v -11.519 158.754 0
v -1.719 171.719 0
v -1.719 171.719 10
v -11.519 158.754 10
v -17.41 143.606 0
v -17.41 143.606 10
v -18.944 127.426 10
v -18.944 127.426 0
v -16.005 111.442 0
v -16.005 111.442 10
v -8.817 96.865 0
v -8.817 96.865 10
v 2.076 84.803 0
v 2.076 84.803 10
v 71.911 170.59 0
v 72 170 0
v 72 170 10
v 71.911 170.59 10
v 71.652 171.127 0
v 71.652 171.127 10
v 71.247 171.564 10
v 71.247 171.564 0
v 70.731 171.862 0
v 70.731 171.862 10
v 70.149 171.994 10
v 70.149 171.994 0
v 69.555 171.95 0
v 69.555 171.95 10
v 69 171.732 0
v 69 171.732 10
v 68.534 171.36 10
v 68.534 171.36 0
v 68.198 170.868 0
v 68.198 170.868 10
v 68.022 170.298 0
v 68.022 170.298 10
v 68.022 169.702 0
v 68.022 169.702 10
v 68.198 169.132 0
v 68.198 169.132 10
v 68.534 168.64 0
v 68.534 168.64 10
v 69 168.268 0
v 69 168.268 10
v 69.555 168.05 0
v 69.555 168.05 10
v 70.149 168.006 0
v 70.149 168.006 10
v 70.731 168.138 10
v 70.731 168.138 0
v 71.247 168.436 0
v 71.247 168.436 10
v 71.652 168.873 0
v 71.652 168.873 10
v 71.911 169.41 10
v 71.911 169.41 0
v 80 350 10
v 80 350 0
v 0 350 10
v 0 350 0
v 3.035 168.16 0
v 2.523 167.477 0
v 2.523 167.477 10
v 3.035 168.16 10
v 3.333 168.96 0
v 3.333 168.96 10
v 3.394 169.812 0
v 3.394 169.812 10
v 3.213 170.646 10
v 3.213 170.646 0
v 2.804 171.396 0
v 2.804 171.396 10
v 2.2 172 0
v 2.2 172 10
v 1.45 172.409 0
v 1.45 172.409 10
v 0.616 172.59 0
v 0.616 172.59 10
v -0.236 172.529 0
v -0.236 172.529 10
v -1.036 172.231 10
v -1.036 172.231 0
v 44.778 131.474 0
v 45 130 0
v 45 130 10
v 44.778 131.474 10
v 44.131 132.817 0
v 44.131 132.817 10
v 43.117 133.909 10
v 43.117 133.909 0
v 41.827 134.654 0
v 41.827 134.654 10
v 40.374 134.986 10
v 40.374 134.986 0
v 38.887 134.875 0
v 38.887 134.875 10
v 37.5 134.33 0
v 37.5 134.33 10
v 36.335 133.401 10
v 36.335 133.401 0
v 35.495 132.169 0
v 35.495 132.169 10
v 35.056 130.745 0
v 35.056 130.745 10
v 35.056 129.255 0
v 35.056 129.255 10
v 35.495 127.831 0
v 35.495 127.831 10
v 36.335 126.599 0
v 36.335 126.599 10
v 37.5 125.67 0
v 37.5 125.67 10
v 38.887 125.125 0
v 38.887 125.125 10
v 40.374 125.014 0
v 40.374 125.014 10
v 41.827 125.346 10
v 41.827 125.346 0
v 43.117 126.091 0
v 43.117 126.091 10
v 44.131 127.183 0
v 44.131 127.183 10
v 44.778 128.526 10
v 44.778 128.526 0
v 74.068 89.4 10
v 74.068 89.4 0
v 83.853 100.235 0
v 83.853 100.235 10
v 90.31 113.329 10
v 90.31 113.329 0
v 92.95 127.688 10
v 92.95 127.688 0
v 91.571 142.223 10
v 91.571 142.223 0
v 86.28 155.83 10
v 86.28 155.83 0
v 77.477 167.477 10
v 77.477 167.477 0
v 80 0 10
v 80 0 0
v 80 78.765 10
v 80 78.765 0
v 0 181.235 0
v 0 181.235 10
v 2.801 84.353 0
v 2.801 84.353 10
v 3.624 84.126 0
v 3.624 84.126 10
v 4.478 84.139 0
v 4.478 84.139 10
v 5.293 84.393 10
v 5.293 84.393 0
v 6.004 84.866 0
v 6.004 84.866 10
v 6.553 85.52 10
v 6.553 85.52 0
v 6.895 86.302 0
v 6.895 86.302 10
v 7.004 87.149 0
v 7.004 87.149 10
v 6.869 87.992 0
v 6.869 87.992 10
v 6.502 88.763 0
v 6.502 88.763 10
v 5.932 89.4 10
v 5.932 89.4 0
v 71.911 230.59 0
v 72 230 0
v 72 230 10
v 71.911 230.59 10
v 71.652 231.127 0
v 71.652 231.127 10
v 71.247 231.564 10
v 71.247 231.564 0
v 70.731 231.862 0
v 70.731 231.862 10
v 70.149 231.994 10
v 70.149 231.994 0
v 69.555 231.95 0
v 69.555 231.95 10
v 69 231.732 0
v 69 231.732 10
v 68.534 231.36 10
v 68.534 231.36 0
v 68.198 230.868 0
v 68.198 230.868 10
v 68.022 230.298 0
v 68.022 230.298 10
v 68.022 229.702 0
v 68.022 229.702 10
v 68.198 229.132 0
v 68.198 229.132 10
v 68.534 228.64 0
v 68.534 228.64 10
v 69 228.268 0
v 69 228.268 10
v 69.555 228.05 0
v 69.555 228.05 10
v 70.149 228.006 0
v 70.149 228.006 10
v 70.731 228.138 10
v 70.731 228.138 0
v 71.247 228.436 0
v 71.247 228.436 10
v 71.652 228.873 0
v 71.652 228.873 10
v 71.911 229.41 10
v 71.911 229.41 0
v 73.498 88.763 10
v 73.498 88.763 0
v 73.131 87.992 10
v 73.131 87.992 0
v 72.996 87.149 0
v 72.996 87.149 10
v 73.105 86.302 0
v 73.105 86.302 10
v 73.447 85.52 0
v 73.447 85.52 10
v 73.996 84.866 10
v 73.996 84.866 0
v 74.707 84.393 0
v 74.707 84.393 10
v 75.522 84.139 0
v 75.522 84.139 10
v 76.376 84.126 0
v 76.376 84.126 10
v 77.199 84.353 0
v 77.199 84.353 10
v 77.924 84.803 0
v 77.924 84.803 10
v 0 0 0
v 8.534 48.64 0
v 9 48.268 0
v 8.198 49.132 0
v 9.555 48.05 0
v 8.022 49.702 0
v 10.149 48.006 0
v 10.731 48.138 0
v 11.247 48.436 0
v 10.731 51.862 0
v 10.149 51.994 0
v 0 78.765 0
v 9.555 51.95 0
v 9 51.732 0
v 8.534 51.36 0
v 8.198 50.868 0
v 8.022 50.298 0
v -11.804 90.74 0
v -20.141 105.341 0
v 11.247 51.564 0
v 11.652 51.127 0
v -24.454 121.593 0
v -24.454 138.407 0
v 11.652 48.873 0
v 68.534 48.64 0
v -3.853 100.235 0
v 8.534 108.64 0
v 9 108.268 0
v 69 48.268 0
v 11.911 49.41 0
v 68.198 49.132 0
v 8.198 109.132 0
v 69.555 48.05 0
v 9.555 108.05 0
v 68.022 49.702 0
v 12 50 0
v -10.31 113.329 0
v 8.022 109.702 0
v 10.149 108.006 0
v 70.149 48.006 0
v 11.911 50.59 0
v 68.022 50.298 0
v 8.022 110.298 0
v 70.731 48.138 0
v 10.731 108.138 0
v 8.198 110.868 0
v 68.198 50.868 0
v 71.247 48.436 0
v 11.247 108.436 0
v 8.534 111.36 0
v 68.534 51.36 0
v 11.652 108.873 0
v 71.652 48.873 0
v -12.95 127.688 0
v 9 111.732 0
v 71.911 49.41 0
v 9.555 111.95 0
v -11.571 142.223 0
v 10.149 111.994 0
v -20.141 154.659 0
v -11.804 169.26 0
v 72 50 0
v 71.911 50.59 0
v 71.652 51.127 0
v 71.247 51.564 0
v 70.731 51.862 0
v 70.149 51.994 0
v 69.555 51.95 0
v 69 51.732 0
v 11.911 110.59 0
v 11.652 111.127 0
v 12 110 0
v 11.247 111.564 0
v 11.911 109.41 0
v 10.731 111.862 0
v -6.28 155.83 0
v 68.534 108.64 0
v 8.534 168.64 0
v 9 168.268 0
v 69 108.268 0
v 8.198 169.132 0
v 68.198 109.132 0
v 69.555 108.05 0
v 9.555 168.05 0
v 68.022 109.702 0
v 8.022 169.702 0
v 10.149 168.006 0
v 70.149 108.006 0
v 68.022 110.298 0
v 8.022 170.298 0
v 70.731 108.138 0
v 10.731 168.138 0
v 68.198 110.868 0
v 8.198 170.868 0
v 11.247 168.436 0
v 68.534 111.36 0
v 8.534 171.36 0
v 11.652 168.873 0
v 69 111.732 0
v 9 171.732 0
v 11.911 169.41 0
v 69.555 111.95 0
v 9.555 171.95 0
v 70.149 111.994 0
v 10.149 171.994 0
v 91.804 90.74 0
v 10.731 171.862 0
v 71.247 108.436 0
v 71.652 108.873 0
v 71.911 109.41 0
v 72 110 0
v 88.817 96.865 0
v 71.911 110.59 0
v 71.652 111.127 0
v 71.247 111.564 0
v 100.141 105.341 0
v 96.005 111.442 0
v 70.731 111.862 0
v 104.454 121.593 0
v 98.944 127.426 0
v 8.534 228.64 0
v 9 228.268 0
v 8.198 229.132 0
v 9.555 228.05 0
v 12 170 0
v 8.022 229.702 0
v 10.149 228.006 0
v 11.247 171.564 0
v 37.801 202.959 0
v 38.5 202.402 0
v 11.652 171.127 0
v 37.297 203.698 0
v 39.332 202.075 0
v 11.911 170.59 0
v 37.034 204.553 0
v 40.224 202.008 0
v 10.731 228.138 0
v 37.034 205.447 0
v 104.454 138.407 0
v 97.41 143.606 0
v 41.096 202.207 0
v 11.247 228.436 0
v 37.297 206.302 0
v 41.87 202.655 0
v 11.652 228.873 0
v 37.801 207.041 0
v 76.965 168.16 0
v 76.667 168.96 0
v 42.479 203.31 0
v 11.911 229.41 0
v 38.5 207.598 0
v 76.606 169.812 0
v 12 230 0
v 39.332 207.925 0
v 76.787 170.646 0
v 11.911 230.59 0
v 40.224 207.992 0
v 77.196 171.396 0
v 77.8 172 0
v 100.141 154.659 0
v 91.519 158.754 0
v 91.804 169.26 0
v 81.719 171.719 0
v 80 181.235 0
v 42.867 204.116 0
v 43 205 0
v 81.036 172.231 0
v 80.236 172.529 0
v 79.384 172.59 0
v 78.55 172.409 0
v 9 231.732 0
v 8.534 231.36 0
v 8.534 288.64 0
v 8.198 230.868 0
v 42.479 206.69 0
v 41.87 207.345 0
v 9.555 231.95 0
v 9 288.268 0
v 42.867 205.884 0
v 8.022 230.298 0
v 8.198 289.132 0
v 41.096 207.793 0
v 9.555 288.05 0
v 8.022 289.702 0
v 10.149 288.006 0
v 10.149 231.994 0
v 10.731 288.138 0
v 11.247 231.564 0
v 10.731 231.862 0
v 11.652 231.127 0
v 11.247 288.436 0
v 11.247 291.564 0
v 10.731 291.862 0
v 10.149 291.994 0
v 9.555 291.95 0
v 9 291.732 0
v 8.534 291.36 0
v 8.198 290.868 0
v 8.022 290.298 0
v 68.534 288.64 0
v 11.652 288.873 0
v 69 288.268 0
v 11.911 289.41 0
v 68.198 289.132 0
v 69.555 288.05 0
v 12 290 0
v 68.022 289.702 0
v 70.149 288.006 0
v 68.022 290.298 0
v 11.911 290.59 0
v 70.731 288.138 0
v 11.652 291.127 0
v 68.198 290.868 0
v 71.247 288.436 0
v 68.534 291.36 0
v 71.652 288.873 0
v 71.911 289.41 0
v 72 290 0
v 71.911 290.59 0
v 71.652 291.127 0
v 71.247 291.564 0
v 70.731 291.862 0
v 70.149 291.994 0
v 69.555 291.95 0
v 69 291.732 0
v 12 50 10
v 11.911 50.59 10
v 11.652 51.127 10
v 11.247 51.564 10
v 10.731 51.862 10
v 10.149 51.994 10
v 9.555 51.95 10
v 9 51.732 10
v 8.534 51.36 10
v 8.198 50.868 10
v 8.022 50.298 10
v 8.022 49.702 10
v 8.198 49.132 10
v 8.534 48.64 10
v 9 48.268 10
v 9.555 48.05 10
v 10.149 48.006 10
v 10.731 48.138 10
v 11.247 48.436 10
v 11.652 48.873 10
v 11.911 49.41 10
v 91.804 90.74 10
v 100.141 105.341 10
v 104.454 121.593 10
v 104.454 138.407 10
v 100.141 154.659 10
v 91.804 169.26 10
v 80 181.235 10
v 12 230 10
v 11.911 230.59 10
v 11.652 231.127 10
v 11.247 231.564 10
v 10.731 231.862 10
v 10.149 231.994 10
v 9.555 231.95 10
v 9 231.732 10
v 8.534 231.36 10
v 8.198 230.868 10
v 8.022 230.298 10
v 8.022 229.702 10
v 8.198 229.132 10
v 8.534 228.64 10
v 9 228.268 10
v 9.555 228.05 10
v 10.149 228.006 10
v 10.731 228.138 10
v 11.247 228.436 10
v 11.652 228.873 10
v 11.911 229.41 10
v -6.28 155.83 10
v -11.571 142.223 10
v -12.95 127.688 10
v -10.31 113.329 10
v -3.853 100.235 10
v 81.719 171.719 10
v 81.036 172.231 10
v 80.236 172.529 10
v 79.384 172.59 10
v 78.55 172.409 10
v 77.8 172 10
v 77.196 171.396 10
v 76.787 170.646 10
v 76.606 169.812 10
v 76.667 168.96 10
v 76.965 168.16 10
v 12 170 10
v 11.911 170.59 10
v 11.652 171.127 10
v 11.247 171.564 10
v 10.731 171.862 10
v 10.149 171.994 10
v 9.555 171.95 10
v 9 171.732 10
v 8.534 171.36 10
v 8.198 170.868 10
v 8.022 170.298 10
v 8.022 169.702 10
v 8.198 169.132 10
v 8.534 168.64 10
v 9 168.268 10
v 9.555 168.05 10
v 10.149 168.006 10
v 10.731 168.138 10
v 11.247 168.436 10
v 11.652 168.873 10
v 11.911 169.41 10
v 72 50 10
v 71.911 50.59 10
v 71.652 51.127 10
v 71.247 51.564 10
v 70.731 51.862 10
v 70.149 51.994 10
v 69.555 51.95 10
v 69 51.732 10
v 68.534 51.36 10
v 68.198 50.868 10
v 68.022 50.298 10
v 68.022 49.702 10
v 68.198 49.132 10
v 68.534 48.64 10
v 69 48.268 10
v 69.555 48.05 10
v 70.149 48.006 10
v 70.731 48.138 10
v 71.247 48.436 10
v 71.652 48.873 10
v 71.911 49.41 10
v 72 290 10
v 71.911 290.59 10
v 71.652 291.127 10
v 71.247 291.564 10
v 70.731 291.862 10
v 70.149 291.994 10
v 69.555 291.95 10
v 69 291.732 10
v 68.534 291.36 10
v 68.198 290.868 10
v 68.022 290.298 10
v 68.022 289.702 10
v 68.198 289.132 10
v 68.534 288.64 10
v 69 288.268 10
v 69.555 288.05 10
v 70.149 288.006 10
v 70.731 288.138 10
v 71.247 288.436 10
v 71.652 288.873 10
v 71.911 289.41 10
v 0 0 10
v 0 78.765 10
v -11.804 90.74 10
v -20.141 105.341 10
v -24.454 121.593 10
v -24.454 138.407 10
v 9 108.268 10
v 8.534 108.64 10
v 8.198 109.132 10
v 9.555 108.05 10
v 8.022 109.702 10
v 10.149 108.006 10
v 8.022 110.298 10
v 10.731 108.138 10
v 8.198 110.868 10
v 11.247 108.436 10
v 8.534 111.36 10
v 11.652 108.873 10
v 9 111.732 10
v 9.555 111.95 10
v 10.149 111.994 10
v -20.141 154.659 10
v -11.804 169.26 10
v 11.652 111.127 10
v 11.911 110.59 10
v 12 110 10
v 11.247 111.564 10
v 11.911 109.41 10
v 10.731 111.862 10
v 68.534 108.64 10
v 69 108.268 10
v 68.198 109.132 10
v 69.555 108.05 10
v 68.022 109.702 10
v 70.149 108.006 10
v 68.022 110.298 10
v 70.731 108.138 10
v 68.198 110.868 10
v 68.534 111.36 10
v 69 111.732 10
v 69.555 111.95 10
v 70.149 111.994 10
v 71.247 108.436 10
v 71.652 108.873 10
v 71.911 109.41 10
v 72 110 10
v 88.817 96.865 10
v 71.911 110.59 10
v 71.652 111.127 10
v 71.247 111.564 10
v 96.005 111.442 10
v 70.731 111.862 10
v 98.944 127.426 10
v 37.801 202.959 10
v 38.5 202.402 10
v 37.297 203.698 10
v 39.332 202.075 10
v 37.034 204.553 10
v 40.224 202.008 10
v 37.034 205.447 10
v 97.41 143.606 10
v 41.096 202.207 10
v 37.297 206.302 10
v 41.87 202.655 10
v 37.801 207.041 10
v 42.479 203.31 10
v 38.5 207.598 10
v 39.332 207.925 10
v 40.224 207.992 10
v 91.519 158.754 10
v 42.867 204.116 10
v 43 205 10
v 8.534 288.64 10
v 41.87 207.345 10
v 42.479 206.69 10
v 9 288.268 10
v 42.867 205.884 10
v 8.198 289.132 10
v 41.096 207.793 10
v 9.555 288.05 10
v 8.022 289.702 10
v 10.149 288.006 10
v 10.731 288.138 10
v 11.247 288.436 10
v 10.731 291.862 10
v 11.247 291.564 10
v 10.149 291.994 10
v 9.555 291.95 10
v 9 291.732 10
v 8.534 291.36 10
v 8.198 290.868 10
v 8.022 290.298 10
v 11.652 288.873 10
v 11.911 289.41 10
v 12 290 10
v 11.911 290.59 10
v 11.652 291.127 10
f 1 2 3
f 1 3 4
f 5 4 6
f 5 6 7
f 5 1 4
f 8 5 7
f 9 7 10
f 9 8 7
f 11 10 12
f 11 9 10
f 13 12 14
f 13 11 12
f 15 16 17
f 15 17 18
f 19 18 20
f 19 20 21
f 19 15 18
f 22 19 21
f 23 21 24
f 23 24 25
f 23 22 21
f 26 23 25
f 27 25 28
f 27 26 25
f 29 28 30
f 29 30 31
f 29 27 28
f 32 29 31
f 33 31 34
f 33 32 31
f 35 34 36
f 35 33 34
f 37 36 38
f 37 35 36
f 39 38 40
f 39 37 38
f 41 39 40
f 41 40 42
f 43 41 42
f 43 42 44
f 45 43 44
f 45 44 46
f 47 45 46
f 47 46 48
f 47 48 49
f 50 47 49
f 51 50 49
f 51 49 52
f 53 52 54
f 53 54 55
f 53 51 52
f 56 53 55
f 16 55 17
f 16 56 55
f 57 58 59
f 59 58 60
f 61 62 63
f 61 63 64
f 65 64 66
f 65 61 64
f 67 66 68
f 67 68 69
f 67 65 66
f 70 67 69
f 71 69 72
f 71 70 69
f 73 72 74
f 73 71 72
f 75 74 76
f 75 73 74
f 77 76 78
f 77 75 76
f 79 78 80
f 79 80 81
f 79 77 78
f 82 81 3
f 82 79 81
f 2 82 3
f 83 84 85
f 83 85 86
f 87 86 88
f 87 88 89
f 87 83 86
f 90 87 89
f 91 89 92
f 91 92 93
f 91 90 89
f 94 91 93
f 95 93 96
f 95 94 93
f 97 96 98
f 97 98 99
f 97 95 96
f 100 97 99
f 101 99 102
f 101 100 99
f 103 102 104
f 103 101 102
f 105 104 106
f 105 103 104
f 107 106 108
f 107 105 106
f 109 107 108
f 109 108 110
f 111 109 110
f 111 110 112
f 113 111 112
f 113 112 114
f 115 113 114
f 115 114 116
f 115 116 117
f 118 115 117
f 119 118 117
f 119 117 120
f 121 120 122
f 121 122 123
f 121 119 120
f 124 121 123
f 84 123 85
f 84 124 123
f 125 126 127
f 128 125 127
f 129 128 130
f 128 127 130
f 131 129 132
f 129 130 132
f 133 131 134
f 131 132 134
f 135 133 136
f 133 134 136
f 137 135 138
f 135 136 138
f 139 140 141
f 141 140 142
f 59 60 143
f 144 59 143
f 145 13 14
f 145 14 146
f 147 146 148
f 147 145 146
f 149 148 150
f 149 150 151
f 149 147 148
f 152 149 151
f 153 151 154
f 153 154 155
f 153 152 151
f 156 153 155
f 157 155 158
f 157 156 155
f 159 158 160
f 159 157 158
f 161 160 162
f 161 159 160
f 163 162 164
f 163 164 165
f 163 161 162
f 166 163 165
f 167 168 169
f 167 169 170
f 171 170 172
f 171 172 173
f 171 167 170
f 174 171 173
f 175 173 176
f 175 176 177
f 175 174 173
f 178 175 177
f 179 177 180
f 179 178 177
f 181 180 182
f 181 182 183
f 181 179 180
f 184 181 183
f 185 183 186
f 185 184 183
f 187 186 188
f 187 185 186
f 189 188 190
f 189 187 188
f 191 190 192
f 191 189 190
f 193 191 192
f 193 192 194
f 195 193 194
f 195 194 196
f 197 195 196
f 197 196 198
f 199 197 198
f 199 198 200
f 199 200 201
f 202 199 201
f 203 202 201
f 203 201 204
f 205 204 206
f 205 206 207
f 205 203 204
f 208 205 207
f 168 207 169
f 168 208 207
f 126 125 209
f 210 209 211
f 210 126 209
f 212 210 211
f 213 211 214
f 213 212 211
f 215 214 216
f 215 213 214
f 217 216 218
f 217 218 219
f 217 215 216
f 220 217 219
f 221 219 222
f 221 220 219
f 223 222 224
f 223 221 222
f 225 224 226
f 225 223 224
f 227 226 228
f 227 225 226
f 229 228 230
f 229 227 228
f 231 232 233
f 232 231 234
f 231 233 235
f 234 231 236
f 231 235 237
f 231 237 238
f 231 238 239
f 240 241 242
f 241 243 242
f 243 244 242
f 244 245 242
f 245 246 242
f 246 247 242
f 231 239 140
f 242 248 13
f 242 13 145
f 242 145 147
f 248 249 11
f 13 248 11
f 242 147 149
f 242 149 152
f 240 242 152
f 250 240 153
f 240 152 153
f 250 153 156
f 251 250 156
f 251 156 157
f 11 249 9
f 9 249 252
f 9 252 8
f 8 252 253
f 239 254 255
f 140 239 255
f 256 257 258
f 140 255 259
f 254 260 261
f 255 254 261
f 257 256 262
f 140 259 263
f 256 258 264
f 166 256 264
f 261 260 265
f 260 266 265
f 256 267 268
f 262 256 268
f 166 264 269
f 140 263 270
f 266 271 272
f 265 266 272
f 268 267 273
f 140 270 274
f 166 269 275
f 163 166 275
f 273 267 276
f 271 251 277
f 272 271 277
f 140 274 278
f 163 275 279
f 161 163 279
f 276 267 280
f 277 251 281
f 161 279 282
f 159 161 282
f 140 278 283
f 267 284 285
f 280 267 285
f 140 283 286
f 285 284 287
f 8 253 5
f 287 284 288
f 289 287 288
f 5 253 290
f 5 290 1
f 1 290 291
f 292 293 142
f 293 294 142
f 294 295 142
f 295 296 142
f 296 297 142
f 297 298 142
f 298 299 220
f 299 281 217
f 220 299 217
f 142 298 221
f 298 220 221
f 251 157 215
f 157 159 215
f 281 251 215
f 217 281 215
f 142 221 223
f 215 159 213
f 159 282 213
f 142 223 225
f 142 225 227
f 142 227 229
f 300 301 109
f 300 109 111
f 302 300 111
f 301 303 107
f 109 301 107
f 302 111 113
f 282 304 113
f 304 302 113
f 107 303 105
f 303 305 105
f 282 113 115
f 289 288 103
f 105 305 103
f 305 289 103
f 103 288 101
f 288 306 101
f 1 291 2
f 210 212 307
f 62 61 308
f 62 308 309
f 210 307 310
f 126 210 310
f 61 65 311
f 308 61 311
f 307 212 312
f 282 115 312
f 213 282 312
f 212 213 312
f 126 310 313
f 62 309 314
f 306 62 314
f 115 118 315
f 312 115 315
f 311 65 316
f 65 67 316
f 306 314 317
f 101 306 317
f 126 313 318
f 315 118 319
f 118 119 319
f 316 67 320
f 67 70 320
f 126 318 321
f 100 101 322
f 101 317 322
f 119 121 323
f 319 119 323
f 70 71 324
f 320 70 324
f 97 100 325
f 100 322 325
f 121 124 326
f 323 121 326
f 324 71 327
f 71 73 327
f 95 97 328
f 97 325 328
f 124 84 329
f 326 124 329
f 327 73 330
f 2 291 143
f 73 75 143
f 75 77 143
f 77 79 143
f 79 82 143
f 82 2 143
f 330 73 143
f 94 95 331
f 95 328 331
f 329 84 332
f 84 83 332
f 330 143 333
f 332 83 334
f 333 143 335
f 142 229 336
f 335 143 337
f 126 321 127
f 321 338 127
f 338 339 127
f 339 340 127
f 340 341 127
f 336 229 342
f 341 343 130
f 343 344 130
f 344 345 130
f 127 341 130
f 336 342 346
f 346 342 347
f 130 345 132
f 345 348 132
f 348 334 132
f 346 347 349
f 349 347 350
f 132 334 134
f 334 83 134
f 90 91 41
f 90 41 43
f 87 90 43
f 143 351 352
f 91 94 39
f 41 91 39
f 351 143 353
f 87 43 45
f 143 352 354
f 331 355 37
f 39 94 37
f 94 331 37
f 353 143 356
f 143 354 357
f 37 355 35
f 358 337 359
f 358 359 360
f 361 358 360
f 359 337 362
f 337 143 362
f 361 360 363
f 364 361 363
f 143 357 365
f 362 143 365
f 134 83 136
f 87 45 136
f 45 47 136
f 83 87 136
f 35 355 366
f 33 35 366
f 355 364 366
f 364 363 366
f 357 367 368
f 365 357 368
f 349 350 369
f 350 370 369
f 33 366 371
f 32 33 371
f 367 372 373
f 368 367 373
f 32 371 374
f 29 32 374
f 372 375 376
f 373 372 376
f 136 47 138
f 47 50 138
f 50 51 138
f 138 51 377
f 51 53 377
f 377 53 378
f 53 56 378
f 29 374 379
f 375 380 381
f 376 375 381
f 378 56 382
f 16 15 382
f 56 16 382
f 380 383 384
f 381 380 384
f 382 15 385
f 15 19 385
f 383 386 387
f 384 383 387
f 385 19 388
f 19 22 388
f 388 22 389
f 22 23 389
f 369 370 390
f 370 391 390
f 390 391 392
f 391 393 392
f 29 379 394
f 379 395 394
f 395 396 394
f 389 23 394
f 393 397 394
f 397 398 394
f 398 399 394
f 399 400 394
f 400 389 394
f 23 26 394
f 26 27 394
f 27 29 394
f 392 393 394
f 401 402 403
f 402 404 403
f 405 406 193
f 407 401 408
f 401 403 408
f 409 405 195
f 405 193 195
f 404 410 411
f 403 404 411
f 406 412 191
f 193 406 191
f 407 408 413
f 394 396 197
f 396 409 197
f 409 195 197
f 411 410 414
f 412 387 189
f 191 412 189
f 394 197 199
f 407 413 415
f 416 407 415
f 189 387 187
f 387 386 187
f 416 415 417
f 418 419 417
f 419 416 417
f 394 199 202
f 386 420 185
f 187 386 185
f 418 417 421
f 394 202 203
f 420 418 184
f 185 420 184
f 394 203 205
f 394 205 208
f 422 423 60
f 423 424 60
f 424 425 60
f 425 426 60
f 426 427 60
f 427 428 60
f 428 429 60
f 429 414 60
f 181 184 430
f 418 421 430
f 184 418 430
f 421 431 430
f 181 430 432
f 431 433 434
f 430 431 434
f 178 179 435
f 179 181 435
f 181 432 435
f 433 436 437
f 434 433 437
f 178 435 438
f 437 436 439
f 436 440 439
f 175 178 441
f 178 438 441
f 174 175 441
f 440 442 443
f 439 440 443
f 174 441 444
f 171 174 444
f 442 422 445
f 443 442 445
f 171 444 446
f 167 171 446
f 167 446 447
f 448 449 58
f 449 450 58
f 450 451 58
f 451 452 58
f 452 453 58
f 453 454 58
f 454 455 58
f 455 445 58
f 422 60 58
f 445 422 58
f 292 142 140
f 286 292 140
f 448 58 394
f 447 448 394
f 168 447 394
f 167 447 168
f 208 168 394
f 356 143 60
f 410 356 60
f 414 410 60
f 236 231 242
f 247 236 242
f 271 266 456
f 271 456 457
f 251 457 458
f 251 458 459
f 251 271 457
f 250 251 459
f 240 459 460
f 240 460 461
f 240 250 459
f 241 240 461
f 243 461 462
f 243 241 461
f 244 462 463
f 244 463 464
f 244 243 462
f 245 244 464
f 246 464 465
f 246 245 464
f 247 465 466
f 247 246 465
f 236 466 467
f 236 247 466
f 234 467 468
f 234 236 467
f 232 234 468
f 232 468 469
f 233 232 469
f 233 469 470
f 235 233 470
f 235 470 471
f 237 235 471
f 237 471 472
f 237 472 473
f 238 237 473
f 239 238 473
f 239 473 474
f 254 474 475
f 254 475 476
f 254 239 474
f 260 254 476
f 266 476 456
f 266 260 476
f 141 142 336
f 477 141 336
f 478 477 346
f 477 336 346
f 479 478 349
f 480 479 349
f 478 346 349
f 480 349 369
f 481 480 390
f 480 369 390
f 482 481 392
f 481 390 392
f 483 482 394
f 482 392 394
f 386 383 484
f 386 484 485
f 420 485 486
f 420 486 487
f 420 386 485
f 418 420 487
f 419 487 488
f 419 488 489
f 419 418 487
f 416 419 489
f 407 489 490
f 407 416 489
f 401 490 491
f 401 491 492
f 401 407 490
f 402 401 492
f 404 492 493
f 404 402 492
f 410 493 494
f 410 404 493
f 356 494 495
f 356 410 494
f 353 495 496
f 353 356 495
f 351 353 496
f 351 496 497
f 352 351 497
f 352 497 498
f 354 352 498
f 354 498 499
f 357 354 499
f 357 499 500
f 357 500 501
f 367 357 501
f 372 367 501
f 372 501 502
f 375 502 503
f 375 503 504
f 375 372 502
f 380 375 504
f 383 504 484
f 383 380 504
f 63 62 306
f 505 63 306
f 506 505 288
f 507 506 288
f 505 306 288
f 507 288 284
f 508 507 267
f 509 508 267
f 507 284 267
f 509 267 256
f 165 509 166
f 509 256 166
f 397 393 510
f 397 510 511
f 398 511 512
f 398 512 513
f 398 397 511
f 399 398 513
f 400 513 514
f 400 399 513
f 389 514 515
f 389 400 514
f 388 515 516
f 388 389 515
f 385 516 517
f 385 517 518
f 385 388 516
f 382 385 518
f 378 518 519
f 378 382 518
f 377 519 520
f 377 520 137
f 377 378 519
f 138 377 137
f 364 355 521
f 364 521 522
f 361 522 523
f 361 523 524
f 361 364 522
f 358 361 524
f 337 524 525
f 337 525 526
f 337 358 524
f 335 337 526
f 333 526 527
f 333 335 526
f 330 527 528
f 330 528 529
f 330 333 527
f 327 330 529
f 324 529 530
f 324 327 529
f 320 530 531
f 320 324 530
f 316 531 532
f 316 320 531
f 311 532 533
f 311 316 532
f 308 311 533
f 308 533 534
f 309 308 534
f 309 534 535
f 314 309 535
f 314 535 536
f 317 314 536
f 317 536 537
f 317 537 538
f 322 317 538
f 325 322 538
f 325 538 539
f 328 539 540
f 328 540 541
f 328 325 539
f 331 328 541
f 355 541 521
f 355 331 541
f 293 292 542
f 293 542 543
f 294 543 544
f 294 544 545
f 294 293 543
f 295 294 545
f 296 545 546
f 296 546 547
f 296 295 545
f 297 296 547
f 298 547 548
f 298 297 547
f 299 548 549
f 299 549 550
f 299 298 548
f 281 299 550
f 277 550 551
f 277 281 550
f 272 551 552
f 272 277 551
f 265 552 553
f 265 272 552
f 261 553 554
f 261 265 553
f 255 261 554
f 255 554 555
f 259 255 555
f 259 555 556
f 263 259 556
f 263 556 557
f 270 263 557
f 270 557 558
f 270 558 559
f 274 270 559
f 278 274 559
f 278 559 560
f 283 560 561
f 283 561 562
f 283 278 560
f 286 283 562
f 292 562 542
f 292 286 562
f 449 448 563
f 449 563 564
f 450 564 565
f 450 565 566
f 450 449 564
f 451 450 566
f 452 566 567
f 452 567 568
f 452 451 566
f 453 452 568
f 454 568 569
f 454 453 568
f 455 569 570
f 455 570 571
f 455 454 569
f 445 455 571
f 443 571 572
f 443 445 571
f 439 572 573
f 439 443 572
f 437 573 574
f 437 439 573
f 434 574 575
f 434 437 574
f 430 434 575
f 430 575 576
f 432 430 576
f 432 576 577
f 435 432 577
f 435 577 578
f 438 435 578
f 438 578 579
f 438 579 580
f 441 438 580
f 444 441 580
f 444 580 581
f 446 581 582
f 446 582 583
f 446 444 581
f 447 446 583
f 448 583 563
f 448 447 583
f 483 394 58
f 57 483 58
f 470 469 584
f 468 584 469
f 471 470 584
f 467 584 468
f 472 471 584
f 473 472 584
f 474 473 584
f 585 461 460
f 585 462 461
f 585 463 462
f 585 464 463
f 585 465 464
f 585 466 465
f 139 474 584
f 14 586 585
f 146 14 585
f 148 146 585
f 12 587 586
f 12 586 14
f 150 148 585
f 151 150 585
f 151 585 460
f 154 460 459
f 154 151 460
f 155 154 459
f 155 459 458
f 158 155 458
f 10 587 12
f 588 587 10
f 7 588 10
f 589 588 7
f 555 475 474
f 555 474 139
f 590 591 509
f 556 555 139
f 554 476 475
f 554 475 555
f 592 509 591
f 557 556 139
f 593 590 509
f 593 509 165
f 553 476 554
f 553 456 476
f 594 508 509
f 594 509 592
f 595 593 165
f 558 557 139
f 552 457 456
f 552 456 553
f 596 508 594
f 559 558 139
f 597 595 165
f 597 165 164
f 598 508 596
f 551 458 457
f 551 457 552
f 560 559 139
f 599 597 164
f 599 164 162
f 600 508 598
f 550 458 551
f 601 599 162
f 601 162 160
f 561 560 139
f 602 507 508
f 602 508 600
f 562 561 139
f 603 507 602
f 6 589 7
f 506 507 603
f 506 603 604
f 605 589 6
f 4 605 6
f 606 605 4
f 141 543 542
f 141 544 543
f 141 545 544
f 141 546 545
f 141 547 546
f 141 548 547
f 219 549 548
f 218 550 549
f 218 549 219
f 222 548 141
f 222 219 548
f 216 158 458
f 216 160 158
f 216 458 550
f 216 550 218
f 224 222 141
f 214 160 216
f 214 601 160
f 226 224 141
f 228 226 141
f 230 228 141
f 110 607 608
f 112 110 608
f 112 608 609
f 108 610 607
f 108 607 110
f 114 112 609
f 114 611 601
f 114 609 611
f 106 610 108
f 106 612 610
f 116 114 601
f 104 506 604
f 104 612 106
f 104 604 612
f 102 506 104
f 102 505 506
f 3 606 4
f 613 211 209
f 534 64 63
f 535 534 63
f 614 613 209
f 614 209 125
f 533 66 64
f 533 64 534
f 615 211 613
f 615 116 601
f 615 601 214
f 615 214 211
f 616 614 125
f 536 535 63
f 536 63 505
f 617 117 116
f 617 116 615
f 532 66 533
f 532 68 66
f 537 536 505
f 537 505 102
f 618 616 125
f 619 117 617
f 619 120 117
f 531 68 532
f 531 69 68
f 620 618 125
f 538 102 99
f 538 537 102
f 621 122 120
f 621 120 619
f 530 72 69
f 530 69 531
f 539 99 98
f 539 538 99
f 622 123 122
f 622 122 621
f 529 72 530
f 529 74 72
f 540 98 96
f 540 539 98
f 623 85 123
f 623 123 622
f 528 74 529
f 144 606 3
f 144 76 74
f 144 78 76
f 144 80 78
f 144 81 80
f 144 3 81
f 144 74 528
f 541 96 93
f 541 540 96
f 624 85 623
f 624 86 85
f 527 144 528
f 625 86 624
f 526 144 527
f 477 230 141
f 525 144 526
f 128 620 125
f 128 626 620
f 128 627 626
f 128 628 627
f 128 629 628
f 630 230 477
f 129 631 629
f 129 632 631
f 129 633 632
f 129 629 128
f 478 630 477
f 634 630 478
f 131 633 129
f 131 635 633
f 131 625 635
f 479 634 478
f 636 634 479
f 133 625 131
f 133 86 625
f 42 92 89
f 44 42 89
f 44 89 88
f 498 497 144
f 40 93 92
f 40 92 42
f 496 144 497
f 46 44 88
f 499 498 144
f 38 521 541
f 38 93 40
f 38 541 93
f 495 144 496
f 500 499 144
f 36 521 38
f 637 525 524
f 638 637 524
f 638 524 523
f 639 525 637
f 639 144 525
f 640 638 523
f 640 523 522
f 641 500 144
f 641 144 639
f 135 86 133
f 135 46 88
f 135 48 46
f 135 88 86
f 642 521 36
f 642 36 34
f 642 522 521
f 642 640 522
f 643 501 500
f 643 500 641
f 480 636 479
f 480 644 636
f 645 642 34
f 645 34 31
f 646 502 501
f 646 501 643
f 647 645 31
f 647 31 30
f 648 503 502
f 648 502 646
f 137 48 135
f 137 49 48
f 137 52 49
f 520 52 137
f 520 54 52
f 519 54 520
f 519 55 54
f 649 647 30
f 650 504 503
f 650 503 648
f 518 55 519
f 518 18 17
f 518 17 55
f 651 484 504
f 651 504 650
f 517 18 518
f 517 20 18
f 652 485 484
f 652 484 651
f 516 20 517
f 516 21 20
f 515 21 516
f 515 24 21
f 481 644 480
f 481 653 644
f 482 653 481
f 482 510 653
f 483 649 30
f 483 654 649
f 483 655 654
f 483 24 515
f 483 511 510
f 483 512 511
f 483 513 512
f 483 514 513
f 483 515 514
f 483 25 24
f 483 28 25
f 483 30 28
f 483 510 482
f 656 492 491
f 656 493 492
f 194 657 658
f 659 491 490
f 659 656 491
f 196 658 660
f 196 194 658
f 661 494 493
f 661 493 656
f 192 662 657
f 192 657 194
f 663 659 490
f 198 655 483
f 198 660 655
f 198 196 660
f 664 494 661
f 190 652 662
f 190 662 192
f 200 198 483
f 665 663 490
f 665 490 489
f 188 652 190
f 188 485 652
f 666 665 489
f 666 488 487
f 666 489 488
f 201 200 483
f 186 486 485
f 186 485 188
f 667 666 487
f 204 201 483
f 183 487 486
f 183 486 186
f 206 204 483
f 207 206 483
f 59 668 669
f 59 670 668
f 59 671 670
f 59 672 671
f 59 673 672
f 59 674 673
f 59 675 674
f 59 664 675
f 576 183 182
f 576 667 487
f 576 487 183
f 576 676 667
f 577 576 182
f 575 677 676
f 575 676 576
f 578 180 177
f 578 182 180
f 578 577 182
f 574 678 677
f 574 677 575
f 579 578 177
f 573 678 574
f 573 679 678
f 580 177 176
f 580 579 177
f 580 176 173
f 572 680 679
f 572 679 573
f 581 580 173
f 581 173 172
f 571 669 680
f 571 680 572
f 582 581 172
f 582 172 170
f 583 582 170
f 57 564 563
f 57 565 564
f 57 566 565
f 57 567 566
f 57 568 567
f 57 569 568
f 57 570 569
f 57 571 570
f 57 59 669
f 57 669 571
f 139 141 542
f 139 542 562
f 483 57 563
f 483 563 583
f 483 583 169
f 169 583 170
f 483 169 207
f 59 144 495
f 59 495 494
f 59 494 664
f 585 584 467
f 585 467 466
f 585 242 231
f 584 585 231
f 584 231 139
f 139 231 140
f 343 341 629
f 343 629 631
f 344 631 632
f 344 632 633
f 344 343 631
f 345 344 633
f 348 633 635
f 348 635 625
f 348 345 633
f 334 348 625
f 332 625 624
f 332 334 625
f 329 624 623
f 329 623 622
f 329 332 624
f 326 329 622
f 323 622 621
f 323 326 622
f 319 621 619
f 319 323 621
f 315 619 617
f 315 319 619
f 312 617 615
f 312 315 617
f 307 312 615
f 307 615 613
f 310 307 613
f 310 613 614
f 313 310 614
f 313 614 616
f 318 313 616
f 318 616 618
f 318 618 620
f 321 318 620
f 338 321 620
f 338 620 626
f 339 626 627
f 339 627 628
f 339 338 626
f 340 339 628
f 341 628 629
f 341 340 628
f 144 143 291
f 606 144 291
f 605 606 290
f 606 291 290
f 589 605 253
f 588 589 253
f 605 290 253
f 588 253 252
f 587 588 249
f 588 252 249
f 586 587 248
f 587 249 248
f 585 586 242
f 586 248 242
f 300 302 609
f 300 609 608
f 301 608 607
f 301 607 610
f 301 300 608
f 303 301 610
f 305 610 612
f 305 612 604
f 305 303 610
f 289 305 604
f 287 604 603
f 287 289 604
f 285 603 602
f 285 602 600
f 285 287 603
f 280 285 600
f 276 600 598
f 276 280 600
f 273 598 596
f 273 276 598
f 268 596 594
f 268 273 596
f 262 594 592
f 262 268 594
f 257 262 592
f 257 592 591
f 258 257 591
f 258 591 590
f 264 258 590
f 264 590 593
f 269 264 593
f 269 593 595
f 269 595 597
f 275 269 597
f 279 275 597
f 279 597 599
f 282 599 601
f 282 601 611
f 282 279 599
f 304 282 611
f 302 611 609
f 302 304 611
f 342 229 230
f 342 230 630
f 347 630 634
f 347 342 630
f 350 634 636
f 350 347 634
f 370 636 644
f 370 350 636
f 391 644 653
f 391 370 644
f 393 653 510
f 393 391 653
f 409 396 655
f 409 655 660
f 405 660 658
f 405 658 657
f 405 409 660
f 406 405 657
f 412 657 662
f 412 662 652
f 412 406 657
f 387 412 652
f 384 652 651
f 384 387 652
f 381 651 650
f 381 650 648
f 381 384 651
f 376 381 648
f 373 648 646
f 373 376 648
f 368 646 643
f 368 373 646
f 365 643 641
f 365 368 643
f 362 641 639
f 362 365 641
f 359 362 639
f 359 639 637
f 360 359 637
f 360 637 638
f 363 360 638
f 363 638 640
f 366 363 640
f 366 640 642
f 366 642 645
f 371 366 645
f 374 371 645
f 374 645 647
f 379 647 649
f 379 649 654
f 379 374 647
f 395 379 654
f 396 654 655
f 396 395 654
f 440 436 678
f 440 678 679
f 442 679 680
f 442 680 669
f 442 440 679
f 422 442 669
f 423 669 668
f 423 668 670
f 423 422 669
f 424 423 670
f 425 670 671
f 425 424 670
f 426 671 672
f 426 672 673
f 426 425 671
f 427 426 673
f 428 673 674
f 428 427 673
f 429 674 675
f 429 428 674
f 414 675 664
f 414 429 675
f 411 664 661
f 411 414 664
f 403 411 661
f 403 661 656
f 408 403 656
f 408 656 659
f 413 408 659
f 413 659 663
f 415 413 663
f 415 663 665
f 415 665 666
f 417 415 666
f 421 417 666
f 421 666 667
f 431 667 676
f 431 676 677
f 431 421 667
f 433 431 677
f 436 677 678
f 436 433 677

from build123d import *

# Parameters (mm, degrees)
SKETCH_R   = 2
SKETCH_R_2 = 5
SKETCH_R_3 = 3
PAD_DEPTH  = 10


with BuildPart() as part:
    # Sketch → Pad (new body)
    with BuildSketch(Plane.XY):
        with BuildLine():
            Line((0, 0), (80, 0))
            Line((80, 0), (80, 78.765246))
            ThreePointArc((80, 78.765246), (105, 130), (80, 181.234754))
            Line((80, 181.234754), (80, 350))
            Line((80, 350), (0, 350))
            Line((0, 350), (0, 181.234754))
            ThreePointArc((0, 181.234754), (-25, 130), (0, 78.765246))
            Line((0, 78.765246), (0, 0))
        make_face()
        with Locations((10, 50)):
            Circle(SKETCH_R, mode=Mode.SUBTRACT)
        with Locations((10, 110)):
            Circle(SKETCH_R, mode=Mode.SUBTRACT)
        with Locations((10, 170)):
            Circle(SKETCH_R, mode=Mode.SUBTRACT)
        with Locations((10, 230)):
            Circle(SKETCH_R, mode=Mode.SUBTRACT)
        with Locations((10, 290)):
            Circle(SKETCH_R, mode=Mode.SUBTRACT)
        with Locations((70, 50)):
            Circle(SKETCH_R, mode=Mode.SUBTRACT)
        with Locations((70, 110)):
            Circle(SKETCH_R, mode=Mode.SUBTRACT)
        with Locations((70, 170)):
            Circle(SKETCH_R, mode=Mode.SUBTRACT)
        with Locations((70, 230)):
            Circle(SKETCH_R, mode=Mode.SUBTRACT)
        with Locations((70, 290)):
            Circle(SKETCH_R, mode=Mode.SUBTRACT)
        with Locations((40, 130)):
            Circle(SKETCH_R_2, mode=Mode.SUBTRACT)
        with Locations((40, 205)):
            Circle(SKETCH_R_3, mode=Mode.SUBTRACT)
        with BuildLine():
            ThreePointArc((-1.7193, 171.7193), (-18.943845, 127.426456), (2.075531, 84.803378))
            ThreePointArc((2.075531, 84.803378), (6.302023, 85.173143), (5.932267, 89.399636))
            ThreePointArc((2.52333, 167.476649), (-12.949555, 127.688159), (5.932267, 89.399636))
            ThreePointArc((2.52333, 167.476649), (2.523346, 171.719295), (-1.7193, 171.7193))
        make_face(mode=Mode.SUBTRACT)
        with BuildLine():
            ThreePointArc((74.067734, 89.399637), (92.949555, 127.688158), (77.476671, 167.476648))
            ThreePointArc((81.7193, 171.7193), (77.476654, 171.719295), (77.476671, 167.476648))
            ThreePointArc((77.924469, 84.803378), (98.943845, 127.426456), (81.7193, 171.7193))
            ThreePointArc((74.067734, 89.399637), (73.697977, 85.173144), (77.924469, 84.803378))
        make_face(mode=Mode.SUBTRACT)
    extrude(amount=PAD_DEPTH)


solid = part.part
